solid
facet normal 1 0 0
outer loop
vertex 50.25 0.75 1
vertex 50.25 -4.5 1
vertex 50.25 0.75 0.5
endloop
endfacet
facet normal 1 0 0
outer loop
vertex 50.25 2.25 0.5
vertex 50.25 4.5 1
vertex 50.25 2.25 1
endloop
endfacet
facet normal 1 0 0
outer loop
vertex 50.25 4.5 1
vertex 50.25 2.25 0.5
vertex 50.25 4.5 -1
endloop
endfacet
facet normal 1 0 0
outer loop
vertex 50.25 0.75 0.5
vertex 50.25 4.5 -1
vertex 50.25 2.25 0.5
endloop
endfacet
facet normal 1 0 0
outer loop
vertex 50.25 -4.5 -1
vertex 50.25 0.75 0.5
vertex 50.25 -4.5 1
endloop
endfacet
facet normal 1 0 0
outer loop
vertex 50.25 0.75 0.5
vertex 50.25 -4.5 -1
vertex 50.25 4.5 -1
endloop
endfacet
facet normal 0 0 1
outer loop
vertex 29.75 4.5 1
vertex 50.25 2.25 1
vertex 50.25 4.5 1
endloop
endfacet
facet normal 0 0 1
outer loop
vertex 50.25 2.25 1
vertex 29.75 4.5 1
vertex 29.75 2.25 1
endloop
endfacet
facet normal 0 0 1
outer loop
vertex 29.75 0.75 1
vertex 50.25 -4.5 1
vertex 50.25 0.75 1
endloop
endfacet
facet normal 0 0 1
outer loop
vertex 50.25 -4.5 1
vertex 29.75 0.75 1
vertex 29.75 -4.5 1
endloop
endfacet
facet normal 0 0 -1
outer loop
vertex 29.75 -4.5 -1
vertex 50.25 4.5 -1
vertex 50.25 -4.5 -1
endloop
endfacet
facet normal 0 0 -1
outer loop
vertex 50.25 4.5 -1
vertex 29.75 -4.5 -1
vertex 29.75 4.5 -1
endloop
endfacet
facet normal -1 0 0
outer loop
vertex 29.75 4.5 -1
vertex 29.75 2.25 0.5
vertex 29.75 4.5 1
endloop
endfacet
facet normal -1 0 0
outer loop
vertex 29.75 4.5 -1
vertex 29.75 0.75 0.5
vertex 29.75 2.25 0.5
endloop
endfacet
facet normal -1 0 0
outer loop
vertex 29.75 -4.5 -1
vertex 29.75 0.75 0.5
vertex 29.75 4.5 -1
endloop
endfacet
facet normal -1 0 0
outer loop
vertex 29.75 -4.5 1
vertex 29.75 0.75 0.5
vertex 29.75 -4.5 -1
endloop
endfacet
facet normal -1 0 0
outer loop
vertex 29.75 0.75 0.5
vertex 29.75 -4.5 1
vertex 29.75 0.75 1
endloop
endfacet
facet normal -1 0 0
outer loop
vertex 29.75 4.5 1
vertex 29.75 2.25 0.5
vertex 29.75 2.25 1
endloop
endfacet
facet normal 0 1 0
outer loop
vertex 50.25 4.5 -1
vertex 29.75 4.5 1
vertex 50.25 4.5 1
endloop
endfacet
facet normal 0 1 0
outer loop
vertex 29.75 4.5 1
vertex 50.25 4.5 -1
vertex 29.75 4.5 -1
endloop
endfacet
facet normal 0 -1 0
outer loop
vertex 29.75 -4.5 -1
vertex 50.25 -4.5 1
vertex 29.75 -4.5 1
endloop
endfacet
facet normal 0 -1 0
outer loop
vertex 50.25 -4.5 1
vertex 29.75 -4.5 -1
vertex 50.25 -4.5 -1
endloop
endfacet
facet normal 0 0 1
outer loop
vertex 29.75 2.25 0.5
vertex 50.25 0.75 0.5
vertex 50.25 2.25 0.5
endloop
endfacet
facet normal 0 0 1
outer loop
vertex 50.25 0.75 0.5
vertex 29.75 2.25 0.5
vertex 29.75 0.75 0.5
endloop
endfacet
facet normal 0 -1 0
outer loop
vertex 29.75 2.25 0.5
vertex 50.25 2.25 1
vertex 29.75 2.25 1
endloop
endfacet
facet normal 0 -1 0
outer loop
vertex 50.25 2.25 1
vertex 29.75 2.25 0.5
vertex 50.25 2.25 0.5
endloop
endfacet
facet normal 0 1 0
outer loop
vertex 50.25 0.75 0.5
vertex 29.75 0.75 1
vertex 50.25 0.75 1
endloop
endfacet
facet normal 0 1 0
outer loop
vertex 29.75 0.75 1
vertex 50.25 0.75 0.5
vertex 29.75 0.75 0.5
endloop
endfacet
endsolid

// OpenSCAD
$fa = 1;
$fs = 0.4;

boxdepth = 10;
boxwidth = 22.5;
wallthickness = 1;
ringheight = 6;
braceoffset = 16;
tubediameter = 11;

module lid() {
  difference () {
    cube([boxwidth-2*wallthickness,boxdepth-1*wallthickness,2],center=true);
    translate([0,boxdepth/2-3.5,1]) cube([20.5,1.5,1],center=true);
  }
  //translate([0,-boxdepth/2,0]) cube([boxwidth-2*wallthickness,wallthickness,2],center=true);
}

module topbox(
  boxwidth=boxwidth,
  boxdepth=boxdepth,
  wallthickness=wallthickness,
  tbheight = 17
  ) {
  difference () {
    cube([boxwidth,boxdepth,tbheight],center=true);
    translate([0,-1,6]) cube([boxwidth-2*wallthickness,boxdepth,10],center=true);
    cube([boxwidth-2*wallthickness,boxdepth-2*wallthickness,tbheight],center=true);
  }  
}
module cardslot (boxwidth=boxwidth,boxdepth=boxdepth,wallthickness=wallthickness, csheight=8) {
  difference () {
    cube([boxwidth,boxdepth,csheight],center=true);
    translate([0,boxdepth/2-3.5,0]) cube([boxwidth-2*wallthickness,1.5,csheight],center=true);
    cube([10,boxdepth-2*wallthickness,csheight],center=true);
  }  
}  

module compressionring(ringheight=ringheight,tubediam=11,ringwall=2) {
  difference() {
    cylinder(h=ringheight,d=tubediam+2*ringwall,center=true);
    cylinder(h=ringheight,d=tubediam,center=true);
    translate([0,-ringheight,0]) cube([1,3,ringheight],center=true);
    
  }
}


module prism(l, w, h) {
       polyhedron(points=[
               [0,0,h],           // 0    front top corner
               [-w,0,0],[w,0,0],   // 1, 2 front left & right bottom corners
               [0,l,h],           // 3    back top corner
               [-w,l,0],[w,l,0]    // 4, 5 back left & right bottom corners
       ], faces=[ // points for all faces must be ordered clockwise when looking in
               [0,2,1],    // top face
               [3,4,5],    // base face
               [0,1,4,3],  // h face
               [1,2,5,4],  // w face
               [0,3,5,2],  // hypotenuse face
       ]);
}

module bottombox(
  boxwidth=boxwidth,
  boxdepth=boxdepth,
  wallthickness=wallthickness,
  ringheight = ringheight, 
  braceoffset=braceoffset, 
  tubediam=tubediameter, 
  ringwall=2, 
  bboxh=13
  ) {
  
  difference () {
    cube([boxwidth,boxdepth,bboxh],center=true);
    cube([boxwidth-2*wallthickness,boxdepth-2*wallthickness,13],center=true);
    //Create a notch for the cable connector
    translate([0,-boxdepth/2+wallthickness,0]) cube([10,wallthickness,bboxh],center=true);
  }
  difference () {
    translate([0,-boxdepth/2,-bboxh/2]) rotate([90,0,0]) prism(ringheight, boxwidth/2, braceoffset*2);
    translate([0,-boxdepth/2-braceoffset,-bboxh/2]) cylinder(d=tubediam + ringwall*2, h=ringheight);
    // This is a little hackish, wanted to make the brace a little wider so needed to make it longer and cut off the tip
    translate([0,-boxdepth/2-braceoffset-tubediam,-bboxh/2+ringheight/2]) cube([braceoffset,braceoffset,ringheight],center=true);
  }
  translate([0,-boxdepth/2-braceoffset,-bboxh/2+ringheight/2]) compressionring(ringheight,tubediam,ringwall);
}

module sensorbox(
  boxwidth = boxwidth,
  boxdepth = boxdepth,
  wallthickness = wallthickness,
  ringheight = ringheight, 
  braceoffset=braceoffset, 
  tubediam=tubediameter, 
  ringwall=2
  ) {
    bboxh=13;
    csheight=8;
    tbheight = 18;
    bottombox(boxwidth,boxdepth,wallthickness,ringheight, braceoffset, tubediam, ringwall, bboxh);
    translate([0,0,bboxh/2+csheight/2]) cardslot(boxwidth,boxdepth,wallthickness,csheight);
    translate([0,0,bboxh/2+csheight+tbheight/2]) topbox(boxwidth,boxdepth,wallthickness,tbheight);
}
//bottombox();
//topbox();  
//cardslot(); 

//sensorbox();
translate ([40,0,0]) lid();
